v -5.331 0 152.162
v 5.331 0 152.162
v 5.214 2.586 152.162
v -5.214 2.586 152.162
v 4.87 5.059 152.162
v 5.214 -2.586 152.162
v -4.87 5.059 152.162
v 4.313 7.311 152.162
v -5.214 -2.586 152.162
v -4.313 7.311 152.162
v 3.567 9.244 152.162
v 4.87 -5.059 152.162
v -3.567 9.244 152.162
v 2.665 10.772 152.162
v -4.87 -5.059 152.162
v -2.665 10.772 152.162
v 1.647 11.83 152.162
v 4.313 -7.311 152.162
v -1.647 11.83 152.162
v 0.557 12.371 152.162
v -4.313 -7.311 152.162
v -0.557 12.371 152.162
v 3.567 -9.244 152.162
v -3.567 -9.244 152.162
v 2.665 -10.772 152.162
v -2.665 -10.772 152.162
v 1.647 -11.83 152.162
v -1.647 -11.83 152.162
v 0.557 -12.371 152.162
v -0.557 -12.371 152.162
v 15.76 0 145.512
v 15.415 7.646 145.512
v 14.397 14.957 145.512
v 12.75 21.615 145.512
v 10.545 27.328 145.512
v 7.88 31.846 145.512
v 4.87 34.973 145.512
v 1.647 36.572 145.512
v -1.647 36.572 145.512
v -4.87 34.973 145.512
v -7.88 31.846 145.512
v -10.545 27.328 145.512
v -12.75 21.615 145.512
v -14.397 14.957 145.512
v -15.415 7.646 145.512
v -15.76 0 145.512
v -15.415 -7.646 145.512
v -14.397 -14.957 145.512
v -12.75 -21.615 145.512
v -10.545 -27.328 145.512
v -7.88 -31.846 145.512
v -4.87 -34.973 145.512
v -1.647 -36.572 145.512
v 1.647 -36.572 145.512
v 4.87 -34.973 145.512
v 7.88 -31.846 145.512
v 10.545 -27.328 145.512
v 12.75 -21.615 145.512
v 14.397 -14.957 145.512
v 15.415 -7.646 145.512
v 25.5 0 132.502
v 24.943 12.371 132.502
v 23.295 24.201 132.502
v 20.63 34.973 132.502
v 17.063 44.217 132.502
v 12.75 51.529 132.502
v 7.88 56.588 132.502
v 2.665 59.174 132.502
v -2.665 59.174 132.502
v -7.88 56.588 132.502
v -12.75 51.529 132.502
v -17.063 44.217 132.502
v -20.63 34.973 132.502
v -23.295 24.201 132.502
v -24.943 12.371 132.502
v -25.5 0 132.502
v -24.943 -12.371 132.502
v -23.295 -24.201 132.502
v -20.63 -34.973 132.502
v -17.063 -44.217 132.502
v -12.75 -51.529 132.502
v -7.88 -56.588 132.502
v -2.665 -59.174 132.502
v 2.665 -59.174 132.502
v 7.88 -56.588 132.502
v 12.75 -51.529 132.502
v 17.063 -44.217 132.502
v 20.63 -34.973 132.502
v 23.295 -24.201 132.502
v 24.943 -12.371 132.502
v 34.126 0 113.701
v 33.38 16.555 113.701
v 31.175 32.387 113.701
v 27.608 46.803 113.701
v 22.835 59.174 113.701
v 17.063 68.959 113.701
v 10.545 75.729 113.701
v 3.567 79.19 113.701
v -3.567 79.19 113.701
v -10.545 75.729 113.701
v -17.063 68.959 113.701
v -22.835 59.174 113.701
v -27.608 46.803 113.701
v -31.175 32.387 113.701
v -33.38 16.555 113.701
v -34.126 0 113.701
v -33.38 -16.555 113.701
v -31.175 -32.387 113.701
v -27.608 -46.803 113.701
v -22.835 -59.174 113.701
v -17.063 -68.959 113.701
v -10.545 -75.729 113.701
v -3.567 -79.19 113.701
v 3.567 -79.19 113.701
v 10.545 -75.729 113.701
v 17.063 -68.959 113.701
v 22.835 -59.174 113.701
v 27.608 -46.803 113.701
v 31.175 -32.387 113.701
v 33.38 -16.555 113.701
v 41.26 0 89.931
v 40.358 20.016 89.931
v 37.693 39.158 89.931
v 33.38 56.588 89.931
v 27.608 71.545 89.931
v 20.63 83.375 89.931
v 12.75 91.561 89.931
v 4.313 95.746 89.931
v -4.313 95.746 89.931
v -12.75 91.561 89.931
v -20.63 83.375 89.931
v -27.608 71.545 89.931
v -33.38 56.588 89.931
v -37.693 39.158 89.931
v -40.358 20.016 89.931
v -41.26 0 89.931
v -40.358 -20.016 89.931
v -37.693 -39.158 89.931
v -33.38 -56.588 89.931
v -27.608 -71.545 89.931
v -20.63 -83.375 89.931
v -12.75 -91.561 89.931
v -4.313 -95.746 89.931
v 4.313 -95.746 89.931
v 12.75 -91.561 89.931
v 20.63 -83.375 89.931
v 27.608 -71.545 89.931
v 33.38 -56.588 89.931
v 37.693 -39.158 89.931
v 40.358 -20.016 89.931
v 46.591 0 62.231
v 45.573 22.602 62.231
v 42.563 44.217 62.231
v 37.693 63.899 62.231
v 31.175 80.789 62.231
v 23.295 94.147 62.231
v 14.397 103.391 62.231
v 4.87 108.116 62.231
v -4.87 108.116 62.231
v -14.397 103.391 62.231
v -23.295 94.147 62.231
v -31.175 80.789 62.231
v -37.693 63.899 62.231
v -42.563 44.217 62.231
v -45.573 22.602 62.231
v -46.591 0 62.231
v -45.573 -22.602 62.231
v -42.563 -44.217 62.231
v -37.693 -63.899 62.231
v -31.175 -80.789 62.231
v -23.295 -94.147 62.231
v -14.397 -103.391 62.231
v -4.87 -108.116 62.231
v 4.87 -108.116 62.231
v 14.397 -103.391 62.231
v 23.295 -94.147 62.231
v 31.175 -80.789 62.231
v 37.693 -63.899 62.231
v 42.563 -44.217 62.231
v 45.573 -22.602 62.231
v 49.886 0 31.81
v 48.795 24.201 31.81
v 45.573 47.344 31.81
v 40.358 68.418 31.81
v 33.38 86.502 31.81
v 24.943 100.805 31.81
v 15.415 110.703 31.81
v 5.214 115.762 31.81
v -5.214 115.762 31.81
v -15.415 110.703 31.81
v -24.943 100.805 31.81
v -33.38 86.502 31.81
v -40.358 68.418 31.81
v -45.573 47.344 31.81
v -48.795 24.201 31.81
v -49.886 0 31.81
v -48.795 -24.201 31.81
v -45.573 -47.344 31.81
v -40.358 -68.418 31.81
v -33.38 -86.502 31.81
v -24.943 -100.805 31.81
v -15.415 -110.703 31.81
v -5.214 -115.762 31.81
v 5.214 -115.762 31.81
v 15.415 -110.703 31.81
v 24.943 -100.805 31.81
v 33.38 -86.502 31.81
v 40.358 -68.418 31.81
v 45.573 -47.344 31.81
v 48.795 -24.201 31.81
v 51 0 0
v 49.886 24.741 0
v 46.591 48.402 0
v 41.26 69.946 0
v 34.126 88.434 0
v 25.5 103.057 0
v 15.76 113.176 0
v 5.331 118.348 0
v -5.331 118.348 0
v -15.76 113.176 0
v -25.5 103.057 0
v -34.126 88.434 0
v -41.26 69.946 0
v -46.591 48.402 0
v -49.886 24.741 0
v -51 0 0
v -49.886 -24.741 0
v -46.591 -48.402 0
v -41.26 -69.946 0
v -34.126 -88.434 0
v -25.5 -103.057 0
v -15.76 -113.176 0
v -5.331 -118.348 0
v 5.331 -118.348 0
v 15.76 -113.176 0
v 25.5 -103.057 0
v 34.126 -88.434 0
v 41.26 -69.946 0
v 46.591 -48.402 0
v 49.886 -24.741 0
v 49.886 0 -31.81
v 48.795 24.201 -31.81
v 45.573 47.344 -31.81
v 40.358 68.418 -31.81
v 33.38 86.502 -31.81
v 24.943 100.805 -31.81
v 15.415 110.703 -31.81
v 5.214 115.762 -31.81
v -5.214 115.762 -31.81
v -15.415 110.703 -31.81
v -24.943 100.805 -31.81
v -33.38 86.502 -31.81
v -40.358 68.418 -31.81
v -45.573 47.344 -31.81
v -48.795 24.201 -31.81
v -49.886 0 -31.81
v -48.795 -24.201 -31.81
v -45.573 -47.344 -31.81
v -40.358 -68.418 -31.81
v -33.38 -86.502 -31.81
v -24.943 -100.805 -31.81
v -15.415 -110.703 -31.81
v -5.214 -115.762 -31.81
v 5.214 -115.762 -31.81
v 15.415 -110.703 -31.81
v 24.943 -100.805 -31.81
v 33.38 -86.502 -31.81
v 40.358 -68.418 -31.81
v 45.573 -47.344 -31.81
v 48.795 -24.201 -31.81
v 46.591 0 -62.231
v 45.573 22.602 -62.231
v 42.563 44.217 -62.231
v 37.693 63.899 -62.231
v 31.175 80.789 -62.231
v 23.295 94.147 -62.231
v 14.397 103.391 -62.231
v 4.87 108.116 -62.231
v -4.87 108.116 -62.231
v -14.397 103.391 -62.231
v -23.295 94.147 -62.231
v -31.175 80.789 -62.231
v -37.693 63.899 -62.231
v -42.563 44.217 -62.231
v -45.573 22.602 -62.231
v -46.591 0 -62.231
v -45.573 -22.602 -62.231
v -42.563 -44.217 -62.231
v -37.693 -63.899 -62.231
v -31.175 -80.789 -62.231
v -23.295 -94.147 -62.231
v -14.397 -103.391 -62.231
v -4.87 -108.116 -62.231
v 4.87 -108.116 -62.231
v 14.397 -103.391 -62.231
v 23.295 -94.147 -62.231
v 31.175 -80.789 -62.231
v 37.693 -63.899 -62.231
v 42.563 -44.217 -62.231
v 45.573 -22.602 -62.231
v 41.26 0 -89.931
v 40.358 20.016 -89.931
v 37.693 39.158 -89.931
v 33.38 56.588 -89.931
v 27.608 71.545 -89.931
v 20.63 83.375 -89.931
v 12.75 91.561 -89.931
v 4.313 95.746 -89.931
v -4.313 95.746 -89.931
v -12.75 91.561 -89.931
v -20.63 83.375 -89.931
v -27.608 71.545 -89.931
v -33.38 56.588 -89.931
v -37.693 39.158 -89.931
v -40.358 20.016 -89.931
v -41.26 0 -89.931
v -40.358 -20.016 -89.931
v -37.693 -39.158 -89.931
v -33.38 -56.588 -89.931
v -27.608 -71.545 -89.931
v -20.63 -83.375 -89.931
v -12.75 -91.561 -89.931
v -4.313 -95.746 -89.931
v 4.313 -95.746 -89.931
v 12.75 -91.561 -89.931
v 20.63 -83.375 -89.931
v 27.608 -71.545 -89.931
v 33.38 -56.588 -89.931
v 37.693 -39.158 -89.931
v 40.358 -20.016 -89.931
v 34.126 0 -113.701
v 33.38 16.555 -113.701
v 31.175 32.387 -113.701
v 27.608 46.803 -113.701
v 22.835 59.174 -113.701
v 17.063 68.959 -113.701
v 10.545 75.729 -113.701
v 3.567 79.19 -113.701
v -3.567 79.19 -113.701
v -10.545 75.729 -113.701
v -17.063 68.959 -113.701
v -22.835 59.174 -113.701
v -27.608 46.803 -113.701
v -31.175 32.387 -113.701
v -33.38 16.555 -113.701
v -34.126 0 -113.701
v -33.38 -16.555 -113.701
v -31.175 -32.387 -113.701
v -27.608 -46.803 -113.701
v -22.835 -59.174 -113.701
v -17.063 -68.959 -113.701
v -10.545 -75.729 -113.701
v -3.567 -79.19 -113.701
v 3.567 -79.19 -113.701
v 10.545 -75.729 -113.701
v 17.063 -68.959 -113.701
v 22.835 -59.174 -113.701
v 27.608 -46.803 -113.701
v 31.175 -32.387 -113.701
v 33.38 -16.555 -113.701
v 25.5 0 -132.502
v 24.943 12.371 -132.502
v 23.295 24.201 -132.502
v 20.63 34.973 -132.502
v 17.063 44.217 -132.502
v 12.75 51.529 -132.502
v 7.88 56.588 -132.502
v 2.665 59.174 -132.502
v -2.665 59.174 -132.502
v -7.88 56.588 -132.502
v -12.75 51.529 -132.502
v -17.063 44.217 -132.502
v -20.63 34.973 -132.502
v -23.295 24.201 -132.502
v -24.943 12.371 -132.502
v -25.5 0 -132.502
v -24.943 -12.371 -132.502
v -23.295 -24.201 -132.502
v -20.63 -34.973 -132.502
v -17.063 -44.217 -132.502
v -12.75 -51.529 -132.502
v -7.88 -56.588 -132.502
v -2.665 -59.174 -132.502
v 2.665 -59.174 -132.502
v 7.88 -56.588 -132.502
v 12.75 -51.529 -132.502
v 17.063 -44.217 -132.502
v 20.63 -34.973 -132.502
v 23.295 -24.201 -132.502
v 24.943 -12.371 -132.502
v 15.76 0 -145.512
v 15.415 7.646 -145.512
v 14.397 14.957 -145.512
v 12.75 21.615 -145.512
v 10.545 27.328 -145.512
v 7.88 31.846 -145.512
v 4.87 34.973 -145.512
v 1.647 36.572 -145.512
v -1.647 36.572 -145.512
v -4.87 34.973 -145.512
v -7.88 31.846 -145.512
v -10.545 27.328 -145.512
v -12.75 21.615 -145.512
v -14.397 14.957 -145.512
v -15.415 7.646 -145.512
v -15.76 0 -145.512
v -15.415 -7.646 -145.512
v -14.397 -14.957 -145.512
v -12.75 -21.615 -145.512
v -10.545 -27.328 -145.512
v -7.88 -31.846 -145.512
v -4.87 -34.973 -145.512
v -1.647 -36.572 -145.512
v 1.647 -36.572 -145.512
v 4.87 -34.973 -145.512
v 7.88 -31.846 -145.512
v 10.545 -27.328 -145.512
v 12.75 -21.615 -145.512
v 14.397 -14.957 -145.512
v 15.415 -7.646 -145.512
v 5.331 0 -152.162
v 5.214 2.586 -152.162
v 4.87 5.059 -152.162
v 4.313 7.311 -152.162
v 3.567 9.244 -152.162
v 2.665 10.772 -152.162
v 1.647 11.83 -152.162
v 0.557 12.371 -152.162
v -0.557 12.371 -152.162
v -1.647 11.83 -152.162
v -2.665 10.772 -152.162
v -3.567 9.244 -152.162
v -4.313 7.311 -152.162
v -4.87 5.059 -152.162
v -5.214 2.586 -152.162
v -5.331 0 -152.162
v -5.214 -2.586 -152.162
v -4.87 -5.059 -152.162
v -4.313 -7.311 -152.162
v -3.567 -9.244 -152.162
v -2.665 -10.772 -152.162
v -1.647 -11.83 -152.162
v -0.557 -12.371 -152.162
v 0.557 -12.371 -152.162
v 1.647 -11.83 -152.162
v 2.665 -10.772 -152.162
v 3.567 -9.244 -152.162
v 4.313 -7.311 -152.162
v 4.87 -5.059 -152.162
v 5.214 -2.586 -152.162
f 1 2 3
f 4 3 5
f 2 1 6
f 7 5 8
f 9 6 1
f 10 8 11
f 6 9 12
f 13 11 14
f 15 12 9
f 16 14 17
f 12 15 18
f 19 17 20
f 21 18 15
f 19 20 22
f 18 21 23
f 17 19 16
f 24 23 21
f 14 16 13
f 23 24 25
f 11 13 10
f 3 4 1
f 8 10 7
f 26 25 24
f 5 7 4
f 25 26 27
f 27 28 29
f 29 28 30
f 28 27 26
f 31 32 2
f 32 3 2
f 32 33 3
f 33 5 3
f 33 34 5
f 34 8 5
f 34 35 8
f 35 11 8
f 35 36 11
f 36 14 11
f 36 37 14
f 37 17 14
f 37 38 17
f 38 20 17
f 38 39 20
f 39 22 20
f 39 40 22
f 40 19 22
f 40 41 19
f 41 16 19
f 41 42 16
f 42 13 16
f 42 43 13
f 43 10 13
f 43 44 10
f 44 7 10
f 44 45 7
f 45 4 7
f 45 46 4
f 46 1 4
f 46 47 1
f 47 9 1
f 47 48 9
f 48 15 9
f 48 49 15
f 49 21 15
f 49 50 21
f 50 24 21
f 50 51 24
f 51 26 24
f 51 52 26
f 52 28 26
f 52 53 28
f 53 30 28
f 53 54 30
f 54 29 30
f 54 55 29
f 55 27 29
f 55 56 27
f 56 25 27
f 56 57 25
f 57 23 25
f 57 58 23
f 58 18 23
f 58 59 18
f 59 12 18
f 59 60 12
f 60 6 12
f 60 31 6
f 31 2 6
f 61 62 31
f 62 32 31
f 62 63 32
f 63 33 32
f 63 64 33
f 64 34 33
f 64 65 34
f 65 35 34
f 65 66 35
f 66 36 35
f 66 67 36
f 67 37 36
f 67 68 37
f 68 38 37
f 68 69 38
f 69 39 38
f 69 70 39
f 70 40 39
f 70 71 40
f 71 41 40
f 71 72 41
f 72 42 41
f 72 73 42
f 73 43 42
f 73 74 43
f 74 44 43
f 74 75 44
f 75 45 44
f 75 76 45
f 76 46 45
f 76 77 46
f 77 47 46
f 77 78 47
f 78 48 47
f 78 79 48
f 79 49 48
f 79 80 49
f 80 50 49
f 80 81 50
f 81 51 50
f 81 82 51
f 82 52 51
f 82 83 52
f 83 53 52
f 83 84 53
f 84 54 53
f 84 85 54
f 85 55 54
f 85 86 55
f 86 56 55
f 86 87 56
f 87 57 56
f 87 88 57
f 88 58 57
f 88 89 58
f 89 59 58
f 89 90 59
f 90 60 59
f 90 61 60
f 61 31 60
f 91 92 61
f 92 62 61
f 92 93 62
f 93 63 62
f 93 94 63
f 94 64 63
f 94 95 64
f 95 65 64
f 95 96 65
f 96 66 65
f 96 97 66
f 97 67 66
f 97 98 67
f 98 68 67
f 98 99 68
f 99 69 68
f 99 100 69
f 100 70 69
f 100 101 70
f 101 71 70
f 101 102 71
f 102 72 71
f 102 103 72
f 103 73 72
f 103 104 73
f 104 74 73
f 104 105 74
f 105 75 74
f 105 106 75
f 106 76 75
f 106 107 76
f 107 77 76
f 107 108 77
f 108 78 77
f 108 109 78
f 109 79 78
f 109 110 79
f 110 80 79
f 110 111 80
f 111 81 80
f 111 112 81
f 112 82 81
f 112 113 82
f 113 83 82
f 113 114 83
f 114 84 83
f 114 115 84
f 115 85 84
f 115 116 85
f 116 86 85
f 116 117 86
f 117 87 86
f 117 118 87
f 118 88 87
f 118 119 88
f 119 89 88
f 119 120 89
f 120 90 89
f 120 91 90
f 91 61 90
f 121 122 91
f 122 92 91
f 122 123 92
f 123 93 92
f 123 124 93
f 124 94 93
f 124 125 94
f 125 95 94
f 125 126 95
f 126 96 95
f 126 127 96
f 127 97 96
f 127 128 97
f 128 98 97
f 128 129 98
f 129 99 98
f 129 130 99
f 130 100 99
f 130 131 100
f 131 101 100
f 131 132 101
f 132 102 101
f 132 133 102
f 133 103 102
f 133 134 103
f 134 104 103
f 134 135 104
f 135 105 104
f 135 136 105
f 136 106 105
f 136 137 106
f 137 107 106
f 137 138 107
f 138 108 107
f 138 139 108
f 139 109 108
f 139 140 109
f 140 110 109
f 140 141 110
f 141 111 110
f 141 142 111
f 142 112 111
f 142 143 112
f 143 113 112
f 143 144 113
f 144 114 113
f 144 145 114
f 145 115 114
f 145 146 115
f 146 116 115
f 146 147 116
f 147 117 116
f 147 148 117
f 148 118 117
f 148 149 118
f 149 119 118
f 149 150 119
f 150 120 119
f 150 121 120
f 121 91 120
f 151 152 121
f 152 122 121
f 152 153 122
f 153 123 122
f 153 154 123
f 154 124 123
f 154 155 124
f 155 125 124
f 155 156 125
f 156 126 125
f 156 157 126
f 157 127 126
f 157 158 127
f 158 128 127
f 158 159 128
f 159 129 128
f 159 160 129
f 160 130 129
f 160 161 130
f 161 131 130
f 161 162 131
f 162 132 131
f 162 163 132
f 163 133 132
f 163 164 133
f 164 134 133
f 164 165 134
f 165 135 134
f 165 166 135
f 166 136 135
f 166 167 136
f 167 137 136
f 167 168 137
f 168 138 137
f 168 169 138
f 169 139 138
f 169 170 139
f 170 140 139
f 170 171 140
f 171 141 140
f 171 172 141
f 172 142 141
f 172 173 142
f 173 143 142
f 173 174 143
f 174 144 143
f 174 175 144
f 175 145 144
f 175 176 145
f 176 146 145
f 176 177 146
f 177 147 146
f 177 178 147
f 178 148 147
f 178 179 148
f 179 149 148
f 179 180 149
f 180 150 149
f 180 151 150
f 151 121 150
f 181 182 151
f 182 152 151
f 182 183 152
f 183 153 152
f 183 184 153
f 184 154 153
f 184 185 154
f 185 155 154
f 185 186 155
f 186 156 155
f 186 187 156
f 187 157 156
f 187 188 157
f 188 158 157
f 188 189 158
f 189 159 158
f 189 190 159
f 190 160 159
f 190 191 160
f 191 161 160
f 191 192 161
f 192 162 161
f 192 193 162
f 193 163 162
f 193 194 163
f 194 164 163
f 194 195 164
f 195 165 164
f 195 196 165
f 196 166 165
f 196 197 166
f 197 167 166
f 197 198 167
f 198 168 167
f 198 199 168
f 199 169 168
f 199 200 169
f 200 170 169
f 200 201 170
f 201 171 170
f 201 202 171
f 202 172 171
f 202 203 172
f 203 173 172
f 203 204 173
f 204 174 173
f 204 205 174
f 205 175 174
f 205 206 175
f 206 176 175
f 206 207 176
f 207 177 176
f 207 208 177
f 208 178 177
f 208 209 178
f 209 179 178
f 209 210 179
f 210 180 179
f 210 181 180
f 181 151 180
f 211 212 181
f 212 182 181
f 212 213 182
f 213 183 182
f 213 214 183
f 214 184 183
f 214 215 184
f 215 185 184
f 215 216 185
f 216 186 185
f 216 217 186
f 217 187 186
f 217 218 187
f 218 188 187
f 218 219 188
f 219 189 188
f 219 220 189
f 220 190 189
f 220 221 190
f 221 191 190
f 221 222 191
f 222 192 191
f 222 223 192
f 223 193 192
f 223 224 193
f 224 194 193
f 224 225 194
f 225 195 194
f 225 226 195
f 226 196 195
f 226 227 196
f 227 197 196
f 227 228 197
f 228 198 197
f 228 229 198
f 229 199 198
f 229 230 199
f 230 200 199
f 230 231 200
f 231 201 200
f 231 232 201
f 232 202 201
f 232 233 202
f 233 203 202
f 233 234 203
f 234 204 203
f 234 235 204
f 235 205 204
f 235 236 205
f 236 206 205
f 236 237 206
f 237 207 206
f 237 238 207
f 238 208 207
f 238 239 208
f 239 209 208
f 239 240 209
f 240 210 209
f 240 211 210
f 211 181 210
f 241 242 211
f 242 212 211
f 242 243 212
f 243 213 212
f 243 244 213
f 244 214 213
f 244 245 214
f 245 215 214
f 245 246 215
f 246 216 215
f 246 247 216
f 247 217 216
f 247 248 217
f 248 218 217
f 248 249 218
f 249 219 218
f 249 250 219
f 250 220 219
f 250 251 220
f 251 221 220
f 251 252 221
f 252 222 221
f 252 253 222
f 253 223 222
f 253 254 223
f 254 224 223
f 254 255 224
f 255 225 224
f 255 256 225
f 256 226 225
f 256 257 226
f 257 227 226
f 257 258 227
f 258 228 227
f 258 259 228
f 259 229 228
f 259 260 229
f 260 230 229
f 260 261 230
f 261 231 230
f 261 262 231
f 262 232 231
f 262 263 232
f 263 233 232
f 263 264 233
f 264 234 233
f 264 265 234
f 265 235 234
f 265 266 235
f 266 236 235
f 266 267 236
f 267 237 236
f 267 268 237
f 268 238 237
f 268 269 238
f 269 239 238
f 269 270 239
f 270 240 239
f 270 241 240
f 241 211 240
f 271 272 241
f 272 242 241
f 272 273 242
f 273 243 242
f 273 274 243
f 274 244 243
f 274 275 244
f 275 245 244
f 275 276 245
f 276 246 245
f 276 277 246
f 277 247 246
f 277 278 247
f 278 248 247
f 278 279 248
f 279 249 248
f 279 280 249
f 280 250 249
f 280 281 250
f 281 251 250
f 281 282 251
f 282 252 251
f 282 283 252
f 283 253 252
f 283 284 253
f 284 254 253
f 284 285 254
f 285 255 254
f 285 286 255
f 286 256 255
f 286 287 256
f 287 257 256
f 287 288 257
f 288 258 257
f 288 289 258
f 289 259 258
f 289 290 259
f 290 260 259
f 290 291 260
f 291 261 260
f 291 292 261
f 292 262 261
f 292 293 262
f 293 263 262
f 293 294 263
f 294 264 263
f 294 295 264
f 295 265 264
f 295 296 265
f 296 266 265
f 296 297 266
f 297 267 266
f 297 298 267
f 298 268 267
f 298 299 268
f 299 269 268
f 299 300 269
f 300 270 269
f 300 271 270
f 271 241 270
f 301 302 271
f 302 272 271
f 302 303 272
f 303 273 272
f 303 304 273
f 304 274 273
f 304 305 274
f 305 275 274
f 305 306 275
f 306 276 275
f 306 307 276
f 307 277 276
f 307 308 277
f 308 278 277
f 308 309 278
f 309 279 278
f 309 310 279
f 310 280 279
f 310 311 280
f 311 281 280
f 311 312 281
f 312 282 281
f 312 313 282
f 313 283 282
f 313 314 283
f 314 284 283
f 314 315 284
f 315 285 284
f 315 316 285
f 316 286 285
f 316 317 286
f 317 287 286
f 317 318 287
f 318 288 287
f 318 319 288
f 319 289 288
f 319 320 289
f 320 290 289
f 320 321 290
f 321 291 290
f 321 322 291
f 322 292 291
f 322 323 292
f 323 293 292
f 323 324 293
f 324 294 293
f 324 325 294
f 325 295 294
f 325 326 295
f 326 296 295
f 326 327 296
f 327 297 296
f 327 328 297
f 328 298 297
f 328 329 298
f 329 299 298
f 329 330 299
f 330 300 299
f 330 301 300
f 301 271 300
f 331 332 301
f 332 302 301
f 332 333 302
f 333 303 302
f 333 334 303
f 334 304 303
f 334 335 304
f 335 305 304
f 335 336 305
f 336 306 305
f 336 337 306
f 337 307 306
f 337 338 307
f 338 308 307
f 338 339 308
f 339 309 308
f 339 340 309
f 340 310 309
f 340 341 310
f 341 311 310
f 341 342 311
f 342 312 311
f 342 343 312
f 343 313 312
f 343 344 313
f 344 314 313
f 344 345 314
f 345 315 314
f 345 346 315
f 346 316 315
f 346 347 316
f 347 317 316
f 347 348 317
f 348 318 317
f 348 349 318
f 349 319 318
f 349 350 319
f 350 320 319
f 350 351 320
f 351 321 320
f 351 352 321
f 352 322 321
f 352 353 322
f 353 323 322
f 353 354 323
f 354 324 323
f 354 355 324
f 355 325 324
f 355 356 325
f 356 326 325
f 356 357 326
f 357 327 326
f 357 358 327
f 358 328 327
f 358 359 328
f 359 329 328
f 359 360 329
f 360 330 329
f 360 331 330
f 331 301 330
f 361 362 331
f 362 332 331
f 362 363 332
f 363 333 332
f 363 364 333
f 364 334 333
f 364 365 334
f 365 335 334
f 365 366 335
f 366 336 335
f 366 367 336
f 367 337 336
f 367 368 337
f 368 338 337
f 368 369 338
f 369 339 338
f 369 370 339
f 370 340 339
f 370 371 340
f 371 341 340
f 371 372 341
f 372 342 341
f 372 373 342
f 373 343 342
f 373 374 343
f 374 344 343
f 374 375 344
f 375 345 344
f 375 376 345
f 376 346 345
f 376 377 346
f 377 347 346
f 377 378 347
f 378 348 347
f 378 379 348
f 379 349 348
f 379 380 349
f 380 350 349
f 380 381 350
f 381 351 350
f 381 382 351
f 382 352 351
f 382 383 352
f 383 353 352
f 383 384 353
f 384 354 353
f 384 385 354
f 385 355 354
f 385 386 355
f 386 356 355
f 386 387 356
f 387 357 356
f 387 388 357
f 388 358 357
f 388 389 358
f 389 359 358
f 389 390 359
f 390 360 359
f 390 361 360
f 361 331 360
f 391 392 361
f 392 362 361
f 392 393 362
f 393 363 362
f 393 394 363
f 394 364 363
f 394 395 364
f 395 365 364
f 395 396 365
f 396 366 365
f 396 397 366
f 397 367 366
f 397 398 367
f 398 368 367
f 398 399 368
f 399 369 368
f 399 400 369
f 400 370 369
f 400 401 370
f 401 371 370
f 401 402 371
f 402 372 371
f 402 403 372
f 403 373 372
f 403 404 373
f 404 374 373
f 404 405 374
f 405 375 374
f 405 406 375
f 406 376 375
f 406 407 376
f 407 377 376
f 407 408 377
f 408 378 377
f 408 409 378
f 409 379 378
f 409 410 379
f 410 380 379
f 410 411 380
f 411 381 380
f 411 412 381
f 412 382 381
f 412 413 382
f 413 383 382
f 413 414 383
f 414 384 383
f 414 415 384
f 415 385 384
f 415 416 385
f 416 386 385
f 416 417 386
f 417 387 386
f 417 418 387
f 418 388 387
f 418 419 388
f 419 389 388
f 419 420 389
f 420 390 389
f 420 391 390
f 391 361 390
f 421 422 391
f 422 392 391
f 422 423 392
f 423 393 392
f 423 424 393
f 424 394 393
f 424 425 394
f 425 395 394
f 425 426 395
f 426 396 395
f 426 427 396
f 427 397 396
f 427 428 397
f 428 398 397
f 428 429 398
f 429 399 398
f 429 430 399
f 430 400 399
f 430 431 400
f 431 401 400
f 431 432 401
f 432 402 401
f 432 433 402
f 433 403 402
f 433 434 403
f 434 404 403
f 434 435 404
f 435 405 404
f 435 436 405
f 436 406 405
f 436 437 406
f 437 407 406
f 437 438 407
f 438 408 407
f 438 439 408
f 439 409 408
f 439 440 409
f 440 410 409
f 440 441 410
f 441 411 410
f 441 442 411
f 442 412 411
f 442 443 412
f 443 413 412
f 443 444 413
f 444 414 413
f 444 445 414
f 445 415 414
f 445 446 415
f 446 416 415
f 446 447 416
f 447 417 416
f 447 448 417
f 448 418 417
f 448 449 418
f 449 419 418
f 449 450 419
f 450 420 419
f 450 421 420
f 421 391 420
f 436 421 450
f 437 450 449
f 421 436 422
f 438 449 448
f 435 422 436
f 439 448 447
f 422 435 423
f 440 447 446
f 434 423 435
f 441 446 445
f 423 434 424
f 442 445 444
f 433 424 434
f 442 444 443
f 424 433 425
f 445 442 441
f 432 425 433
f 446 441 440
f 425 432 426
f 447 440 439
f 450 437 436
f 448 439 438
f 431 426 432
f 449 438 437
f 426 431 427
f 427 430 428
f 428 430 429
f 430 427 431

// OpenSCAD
// Generated by SolidPython 1.0.1 on 2020-07-29 00:39:25


scale(v = [3, 7, 9]) {
	sphere(r = 17);
}
/***********************************************
*********      SolidPython code:      **********
************************************************
 
# import packages: SolidPython
from solid import *
from solid.utils import *
from itertools import chain, combinations


class Resize:

    def __init__(self, scad_file):
        self.scad_file = scad_file
        #self.scad_file = import_scad(scad_file)
        # cone/cylinder param:
        self.r1 = 0
        self.r2 = 0
        self.h = 0
        # rectangular prism param:
        self.w = 0
        self.l = 0
        # ellipse param:
        self.r = 0

    # import OpenScad code (file name corresponds to shape)


    # classify shape + parameters
    def assign(self, param1, param2, param3):
        if self.scad_file == 'cone.scad':
            self.r1 = param1
            self.r2 = param2
            self.h = param3
        elif self.scad_file == 'cylinder.scad':
            self.r1 = param1
            self.r2 = param2
            self.h = param3
        elif self.scad_file == 'rectangularPrism.scad':
            self.h = param1
            self.l = param2
            self.w = param3
        else:
            self.r = param1
            self.h = param2

    # resize parameters
    def iterate(self):
        x = range(3, 20, 2)
        i = 1
        if self.scad_file == 'cone.scad':
            tempList = list(combinations(x, 2))
            for temp in tempList:
                param1 = temp[0]
                param2 = temp[1]
                filepath = 'produced_scad_files/' + 'cone' + str(param1) + '_' + str(param2) + '_' + '.scad'
                scad_render_to_file(cylinder(h=param1, r1=param2, r2=0), filepath)

        elif self.scad_file == 'cylinder.scad':
            tempList = list(combinations(x, 3))
            for temp in tempList:
                param1 = temp[0]
                param2 = temp[1]
                filepath = 'produced_scad_files/' + 'cylinder' + str(param1) + '_' + str(param2) + '_' + '.scad'
                scad_render_to_file(cylinder(h=param1, r1=param2, r2=param2), filepath)

        elif self.scad_file == 'rectangularPrism.scad':
            tempList = list(combinations(x, 3))
            for temp in tempList:
                param1 = temp[0]
                param2 = temp[1]
                param3 = temp[2]
                filepath = 'produced_scad_files/' + 'rectangularPrism' + str(param1) + '_' + str(param2) + '_' + str(
                    param3) + '.scad'
                scad_render_to_file(cube(size=(param1, param2, param3)), filepath)

        elif self.scad_file == 'ellipse.scad':
            tempList = list(combinations(x, 4))
            for temp in tempList:
                param1 = temp[0]
                param2 = temp[1]
                param3 = temp[2]
                param4 = temp[3]
                filepath = 'produced_scad_files/' + 'ellipse' + str(param1) + '_' + str(param2) + '_' + str(param3) + '_' + str(param4) + '.scad'
                scad_render_to_file(scale([param1, param2, param3])(sphere(r=param4)), filepath)

    def render_to_scadfile(self):
        scad_render_to_file(scad, 'example.scad') 
 
************************************************/
